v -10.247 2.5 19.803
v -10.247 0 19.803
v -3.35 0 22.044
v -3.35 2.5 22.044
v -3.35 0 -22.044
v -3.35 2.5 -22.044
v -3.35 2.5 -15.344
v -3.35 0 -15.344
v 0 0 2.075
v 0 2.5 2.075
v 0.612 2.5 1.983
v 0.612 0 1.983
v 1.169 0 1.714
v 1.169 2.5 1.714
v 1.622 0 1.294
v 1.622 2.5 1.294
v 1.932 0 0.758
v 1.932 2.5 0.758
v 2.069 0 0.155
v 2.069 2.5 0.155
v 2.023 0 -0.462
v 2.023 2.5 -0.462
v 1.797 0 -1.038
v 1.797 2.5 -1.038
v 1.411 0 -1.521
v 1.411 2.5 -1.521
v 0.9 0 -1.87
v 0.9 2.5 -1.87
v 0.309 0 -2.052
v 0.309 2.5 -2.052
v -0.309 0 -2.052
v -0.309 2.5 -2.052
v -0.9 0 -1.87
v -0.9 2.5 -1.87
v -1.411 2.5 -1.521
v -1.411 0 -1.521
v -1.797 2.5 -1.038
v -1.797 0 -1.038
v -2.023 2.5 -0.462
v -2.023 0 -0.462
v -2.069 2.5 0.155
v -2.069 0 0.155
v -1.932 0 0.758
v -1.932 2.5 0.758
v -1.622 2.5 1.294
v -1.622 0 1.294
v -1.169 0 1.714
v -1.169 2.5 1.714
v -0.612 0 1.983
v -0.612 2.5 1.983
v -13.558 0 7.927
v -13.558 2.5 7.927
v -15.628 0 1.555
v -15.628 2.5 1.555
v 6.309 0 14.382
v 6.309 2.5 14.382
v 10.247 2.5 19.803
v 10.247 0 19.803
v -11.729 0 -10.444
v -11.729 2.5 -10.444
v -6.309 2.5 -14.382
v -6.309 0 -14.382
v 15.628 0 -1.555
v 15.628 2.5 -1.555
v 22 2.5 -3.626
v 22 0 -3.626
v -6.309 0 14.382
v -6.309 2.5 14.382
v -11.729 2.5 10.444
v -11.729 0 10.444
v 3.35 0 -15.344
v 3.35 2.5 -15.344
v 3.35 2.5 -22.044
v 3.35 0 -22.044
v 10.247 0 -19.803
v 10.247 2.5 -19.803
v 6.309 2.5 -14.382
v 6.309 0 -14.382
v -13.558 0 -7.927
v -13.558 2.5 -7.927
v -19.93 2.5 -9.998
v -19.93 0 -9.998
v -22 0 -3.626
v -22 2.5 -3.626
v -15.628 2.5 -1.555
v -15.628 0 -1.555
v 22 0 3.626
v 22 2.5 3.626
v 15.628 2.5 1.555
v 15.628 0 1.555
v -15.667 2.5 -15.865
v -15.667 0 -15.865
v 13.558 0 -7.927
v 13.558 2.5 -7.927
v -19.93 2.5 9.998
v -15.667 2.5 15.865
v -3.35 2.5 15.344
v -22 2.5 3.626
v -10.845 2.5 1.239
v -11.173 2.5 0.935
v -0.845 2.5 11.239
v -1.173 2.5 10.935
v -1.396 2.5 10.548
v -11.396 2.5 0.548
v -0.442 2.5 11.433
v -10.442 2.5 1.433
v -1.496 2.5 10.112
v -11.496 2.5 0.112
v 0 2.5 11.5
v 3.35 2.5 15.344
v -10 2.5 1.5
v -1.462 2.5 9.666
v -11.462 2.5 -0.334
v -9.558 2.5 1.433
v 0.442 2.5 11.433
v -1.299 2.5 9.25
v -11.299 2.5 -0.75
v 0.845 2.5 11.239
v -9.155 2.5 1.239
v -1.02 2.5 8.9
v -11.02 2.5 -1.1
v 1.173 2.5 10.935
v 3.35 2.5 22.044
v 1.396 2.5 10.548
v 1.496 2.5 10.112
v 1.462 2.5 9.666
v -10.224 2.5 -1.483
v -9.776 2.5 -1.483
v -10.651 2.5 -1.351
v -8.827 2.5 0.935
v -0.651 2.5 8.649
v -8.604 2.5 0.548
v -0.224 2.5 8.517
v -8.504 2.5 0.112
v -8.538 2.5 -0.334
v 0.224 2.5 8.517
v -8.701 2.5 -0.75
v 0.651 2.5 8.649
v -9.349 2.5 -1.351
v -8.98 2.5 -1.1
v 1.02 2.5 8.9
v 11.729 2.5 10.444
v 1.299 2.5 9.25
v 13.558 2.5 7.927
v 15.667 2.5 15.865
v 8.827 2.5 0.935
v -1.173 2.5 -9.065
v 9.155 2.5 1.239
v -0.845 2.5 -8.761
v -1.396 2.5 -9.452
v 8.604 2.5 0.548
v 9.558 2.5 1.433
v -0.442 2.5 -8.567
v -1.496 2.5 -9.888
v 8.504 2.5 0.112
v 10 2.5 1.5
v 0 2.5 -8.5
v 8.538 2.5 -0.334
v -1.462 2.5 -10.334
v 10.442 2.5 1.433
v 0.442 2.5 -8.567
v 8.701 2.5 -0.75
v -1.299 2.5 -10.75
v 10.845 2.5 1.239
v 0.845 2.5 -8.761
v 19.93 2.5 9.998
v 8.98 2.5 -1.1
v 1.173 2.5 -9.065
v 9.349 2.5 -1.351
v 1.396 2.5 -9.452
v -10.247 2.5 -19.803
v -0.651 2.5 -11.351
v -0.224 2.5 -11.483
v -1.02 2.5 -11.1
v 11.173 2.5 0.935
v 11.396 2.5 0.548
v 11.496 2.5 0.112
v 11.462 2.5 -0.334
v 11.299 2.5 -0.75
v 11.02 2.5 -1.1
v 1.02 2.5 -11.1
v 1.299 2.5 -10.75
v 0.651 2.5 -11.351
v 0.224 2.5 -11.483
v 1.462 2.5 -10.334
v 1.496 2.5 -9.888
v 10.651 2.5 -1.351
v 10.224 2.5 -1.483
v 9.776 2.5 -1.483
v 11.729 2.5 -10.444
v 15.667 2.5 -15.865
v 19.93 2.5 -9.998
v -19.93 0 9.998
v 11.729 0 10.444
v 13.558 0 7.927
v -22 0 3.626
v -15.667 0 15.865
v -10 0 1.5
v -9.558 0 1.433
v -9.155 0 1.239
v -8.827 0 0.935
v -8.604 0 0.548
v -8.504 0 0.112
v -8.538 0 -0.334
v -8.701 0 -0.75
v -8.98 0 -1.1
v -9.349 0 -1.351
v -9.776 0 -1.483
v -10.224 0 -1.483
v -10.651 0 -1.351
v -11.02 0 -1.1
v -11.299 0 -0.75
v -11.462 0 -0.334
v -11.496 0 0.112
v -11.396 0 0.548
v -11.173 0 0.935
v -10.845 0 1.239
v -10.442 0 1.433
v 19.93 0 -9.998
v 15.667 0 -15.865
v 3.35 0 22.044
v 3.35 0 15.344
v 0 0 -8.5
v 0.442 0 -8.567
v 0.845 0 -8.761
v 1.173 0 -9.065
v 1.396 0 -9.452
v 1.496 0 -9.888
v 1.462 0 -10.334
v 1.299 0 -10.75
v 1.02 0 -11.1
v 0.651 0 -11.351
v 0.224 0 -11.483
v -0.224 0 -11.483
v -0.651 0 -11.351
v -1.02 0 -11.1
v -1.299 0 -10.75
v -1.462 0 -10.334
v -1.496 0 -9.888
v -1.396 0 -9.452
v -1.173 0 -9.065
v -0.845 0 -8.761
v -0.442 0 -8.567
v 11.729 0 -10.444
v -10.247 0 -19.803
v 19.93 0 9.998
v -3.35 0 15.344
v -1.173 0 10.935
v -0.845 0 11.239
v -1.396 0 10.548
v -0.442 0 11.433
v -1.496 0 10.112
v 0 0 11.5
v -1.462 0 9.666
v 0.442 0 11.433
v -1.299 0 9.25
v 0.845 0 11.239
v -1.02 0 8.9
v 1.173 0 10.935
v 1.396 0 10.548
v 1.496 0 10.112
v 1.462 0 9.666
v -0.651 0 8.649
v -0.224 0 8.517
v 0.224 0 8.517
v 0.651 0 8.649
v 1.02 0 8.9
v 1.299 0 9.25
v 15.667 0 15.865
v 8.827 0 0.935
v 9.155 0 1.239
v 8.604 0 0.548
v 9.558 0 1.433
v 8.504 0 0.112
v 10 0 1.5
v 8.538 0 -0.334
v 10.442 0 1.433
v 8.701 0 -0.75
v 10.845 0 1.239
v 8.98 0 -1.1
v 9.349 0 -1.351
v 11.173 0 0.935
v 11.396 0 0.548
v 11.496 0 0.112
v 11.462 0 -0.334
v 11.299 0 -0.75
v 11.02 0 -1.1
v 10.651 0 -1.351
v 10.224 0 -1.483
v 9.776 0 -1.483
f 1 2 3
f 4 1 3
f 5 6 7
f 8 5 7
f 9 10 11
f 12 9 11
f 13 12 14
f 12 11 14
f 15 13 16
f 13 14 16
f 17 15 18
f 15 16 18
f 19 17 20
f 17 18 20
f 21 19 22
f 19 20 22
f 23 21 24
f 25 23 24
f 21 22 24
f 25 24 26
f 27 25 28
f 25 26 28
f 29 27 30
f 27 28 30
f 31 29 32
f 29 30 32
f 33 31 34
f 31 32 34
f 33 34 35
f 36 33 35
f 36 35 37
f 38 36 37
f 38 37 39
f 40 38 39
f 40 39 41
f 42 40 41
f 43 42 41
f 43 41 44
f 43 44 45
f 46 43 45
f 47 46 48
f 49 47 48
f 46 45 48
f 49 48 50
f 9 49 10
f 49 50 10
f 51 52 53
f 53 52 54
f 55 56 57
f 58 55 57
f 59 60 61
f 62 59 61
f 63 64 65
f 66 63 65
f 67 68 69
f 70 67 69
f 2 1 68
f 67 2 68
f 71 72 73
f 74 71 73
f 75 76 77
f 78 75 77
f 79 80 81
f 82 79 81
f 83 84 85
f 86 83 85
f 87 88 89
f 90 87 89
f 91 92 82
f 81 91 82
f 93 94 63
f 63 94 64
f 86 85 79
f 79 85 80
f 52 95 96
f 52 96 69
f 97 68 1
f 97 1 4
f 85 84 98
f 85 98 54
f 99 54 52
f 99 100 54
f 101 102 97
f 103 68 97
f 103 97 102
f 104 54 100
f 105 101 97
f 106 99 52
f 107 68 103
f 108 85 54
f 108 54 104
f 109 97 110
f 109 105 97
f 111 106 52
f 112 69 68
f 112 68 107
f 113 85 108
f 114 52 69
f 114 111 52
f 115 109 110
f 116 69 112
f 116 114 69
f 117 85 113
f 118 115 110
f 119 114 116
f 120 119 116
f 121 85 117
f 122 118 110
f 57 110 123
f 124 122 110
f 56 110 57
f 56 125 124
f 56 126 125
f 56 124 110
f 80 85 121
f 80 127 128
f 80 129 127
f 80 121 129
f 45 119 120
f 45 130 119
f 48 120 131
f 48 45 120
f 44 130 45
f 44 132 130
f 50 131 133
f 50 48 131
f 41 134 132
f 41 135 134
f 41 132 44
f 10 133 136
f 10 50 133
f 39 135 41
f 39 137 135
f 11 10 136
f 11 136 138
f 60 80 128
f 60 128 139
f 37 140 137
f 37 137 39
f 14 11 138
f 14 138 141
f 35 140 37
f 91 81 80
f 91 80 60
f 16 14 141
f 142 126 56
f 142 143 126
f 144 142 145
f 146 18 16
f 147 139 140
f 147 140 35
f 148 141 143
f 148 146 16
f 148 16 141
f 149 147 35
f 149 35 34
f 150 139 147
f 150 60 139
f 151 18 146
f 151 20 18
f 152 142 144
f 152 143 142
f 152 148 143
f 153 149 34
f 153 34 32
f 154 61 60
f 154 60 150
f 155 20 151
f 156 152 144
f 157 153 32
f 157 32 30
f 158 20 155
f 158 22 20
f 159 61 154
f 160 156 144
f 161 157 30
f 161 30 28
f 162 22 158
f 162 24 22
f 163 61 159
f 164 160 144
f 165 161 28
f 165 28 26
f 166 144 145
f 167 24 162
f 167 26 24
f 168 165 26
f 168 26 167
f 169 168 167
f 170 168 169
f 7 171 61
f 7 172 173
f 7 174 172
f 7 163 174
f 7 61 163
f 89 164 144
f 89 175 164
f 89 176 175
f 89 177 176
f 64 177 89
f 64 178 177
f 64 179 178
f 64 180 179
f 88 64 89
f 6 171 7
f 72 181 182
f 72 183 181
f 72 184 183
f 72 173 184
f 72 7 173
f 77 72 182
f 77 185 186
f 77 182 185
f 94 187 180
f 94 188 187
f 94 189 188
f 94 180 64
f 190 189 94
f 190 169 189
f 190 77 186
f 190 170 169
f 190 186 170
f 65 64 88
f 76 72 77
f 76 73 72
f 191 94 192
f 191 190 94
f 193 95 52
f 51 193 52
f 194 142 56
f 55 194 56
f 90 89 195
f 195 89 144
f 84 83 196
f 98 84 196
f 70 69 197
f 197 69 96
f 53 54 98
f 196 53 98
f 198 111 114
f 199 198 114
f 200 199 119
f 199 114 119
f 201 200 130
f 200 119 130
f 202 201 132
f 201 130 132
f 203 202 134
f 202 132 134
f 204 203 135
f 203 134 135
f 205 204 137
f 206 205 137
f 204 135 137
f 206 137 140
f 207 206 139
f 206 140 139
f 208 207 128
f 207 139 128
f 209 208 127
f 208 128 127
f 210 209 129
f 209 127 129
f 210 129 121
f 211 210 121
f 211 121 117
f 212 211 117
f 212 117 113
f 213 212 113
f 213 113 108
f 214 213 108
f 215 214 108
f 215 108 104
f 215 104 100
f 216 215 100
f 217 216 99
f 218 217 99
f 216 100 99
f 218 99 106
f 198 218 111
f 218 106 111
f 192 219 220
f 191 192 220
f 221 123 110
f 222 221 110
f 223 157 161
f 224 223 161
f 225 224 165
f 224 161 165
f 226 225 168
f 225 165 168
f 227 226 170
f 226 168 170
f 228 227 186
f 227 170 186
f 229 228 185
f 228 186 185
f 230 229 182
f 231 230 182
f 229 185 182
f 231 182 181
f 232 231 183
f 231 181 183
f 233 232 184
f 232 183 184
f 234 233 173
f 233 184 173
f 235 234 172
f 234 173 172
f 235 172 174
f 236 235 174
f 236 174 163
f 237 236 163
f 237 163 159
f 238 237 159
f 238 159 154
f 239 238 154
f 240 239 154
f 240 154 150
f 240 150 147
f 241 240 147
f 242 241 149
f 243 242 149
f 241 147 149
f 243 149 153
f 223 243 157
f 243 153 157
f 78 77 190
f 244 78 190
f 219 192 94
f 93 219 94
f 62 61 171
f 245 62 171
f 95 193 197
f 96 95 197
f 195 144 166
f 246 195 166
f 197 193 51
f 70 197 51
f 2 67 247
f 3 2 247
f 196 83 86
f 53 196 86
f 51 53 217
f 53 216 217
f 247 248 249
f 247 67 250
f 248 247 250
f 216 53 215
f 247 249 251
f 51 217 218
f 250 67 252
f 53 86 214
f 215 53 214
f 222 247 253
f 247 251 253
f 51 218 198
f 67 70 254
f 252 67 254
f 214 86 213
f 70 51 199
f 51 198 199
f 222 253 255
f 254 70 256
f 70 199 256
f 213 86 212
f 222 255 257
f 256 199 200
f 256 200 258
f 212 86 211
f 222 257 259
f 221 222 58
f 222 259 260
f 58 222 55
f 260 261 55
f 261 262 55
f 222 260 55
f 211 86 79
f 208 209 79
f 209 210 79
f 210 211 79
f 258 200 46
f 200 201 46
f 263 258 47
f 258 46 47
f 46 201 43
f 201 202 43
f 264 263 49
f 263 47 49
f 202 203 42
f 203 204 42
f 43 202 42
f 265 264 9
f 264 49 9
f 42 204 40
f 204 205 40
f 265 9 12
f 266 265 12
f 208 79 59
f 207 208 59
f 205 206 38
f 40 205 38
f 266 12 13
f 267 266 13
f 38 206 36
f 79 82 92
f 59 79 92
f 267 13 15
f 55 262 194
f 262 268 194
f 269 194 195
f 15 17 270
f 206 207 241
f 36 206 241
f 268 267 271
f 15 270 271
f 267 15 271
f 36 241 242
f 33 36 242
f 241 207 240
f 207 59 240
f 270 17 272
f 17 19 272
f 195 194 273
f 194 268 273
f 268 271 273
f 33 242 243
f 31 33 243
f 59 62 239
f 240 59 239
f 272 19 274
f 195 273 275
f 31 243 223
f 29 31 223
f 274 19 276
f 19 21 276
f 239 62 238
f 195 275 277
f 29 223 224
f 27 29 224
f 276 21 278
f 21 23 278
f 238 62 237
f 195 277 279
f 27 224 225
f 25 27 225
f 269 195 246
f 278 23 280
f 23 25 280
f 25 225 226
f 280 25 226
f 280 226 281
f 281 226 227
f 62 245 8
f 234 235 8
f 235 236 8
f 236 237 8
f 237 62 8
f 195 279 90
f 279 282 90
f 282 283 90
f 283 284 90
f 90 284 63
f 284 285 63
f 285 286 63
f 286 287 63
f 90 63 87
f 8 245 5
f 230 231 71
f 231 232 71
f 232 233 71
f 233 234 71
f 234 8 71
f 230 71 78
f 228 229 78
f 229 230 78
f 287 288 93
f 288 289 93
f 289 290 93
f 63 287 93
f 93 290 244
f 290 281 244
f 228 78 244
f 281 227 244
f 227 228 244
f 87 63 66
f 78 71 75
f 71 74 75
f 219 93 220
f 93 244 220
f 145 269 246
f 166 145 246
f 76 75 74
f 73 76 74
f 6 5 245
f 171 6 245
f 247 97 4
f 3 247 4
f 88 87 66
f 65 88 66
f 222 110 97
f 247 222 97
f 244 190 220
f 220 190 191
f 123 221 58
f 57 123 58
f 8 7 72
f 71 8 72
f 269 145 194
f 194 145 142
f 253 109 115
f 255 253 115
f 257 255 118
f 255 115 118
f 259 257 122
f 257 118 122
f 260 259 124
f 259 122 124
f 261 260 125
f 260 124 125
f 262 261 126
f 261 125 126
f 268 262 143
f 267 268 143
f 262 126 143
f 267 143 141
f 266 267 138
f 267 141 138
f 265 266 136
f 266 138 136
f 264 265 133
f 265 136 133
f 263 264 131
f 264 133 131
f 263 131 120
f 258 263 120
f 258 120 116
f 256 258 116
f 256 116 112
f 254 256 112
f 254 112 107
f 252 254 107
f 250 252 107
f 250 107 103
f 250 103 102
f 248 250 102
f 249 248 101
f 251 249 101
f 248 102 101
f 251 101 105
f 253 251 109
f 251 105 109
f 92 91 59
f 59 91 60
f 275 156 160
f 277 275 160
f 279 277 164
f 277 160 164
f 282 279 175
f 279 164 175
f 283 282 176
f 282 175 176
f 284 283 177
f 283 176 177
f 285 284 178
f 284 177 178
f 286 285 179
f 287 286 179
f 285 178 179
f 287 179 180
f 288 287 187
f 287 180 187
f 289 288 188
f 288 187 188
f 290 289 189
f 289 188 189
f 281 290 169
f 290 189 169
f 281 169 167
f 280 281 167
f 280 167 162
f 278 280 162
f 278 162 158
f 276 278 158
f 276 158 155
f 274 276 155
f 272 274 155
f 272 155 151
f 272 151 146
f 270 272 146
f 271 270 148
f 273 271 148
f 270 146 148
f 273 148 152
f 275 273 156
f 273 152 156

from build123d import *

# Parameters (mm, degrees)
BOSS_EXTRUDE1_DEPTH = 2.5
CUT_EXTRUDE1_DEPTH  = 2.5
SKETCH7_R           = 1.5
CUT_EXTRUDE3_DEPTH  = 2.5
SKETCH10_R          = 2.075
CUT_EXTRUDE6_DEPTH  = 2.5


with BuildPart() as part:
    # Sketch1 → Boss-Extrude1 (new body)
    with BuildSketch(Plane(origin=(0, 0, 0), x_dir=(1, 0, 0), z_dir=(0, 1, 0))):
        Polygon((0, 23.132168933), (-13.596747752, 18.714317784), (-22, 7.148233317), (-22, -7.148233317), (-13.596747752, -18.714317784), (0, -23.132168933), (13.596747752, -18.714317784), (22, -7.148233317), (22, 7.148233317), (13.596747752, 18.714317784), align=None)
    extrude(amount=BOSS_EXTRUDE1_DEPTH)

    # Sketch2 → Cut-Extrude1 (cut)
    with BuildSketch(Plane(origin=(0, 2.5, 0), x_dir=(1, 0, 0), z_dir=(0, 1, 0))):
        Polygon((0, 23.132168933), (-3.35, 22.043687951), (-3.35, 15.343687951), (3.35, 15.343687951), (3.35, 22.043687951), align=None)
        Polygon((11.729000424, 10.444223713), (15.667161615, 15.864637576), (13.596747752, 18.714317784), (10.246747752, 19.802798766), (6.308586562, 14.382384904), align=None)
        Polygon((15.627921341, 1.555421004), (22, 3.625834866), (22, 7.148233317), (19.929586138, 9.997913525), (13.557507479, 7.927499663), align=None)
        Polygon((13.557507479, -7.927499663), (19.929586138, -9.997913525), (22, -7.148233317), (22, -3.625834866), (15.627921341, -1.555421004), align=None)
        Polygon((6.308586562, -14.382384904), (10.246747752, -19.802798766), (13.596747752, -18.714317784), (15.667161615, -15.864637576), (11.729000424, -10.444223713), align=None)
        Polygon((-3.35, -15.343687951), (-3.35, -22.043687951), (0, -23.132168933), (3.35, -22.043687951), (3.35, -15.343687951), align=None)
        Polygon((-11.729000424, -10.444223713), (-15.667161615, -15.864637576), (-13.596747752, -18.714317784), (-10.246747752, -19.802798766), (-6.308586562, -14.382384904), align=None)
        Polygon((-15.627921341, -1.555421004), (-22, -3.625834866), (-22, -7.148233317), (-19.929586138, -9.997913525), (-13.557507479, -7.927499663), align=None)
        Polygon((-13.557507479, 7.927499663), (-19.929586138, 9.997913525), (-22, 7.148233317), (-22, 3.625834866), (-15.627921341, 1.555421004), align=None)
        Polygon((-6.308586562, 14.382384904), (-10.246747752, 19.802798766), (-13.596747752, 18.714317784), (-15.667161615, 15.864637576), (-11.729000424, 10.444223713), align=None)
    extrude(amount=-CUT_EXTRUDE1_DEPTH, mode=Mode.SUBTRACT)

    # Sketch7 → Cut-Extrude3 (cut)
    with BuildSketch(Plane(origin=(0, 2.5, 0), x_dir=(1, 0, 0), z_dir=(0, 1, 0))):
        with Locations(Location((0, 10, 0), (0, 0, 270))):
            Circle(SKETCH7_R)
        with Locations(Location((10, 0, 0), (0, 0, 270))):
            Circle(SKETCH7_R)
        with Locations(Location((0, -10, 0), (0, 0, 270))):
            Circle(SKETCH7_R)
        with Locations(Location((-10, 0, 0), (0, 0, 270))):
            Circle(SKETCH7_R)
    extrude(amount=-CUT_EXTRUDE3_DEPTH, mode=Mode.SUBTRACT)

    # Sketch10 → Cut-Extrude6 (cut)
    with BuildSketch(Plane(origin=(0, 2.5, 0), x_dir=(1, 0, 0), z_dir=(0, 1, 0))):
        with Locations(Location((0, 0, 0), (0, 0, 270))):
            Circle(SKETCH10_R)
    extrude(amount=-CUT_EXTRUDE6_DEPTH, mode=Mode.SUBTRACT)


solid = part.part
